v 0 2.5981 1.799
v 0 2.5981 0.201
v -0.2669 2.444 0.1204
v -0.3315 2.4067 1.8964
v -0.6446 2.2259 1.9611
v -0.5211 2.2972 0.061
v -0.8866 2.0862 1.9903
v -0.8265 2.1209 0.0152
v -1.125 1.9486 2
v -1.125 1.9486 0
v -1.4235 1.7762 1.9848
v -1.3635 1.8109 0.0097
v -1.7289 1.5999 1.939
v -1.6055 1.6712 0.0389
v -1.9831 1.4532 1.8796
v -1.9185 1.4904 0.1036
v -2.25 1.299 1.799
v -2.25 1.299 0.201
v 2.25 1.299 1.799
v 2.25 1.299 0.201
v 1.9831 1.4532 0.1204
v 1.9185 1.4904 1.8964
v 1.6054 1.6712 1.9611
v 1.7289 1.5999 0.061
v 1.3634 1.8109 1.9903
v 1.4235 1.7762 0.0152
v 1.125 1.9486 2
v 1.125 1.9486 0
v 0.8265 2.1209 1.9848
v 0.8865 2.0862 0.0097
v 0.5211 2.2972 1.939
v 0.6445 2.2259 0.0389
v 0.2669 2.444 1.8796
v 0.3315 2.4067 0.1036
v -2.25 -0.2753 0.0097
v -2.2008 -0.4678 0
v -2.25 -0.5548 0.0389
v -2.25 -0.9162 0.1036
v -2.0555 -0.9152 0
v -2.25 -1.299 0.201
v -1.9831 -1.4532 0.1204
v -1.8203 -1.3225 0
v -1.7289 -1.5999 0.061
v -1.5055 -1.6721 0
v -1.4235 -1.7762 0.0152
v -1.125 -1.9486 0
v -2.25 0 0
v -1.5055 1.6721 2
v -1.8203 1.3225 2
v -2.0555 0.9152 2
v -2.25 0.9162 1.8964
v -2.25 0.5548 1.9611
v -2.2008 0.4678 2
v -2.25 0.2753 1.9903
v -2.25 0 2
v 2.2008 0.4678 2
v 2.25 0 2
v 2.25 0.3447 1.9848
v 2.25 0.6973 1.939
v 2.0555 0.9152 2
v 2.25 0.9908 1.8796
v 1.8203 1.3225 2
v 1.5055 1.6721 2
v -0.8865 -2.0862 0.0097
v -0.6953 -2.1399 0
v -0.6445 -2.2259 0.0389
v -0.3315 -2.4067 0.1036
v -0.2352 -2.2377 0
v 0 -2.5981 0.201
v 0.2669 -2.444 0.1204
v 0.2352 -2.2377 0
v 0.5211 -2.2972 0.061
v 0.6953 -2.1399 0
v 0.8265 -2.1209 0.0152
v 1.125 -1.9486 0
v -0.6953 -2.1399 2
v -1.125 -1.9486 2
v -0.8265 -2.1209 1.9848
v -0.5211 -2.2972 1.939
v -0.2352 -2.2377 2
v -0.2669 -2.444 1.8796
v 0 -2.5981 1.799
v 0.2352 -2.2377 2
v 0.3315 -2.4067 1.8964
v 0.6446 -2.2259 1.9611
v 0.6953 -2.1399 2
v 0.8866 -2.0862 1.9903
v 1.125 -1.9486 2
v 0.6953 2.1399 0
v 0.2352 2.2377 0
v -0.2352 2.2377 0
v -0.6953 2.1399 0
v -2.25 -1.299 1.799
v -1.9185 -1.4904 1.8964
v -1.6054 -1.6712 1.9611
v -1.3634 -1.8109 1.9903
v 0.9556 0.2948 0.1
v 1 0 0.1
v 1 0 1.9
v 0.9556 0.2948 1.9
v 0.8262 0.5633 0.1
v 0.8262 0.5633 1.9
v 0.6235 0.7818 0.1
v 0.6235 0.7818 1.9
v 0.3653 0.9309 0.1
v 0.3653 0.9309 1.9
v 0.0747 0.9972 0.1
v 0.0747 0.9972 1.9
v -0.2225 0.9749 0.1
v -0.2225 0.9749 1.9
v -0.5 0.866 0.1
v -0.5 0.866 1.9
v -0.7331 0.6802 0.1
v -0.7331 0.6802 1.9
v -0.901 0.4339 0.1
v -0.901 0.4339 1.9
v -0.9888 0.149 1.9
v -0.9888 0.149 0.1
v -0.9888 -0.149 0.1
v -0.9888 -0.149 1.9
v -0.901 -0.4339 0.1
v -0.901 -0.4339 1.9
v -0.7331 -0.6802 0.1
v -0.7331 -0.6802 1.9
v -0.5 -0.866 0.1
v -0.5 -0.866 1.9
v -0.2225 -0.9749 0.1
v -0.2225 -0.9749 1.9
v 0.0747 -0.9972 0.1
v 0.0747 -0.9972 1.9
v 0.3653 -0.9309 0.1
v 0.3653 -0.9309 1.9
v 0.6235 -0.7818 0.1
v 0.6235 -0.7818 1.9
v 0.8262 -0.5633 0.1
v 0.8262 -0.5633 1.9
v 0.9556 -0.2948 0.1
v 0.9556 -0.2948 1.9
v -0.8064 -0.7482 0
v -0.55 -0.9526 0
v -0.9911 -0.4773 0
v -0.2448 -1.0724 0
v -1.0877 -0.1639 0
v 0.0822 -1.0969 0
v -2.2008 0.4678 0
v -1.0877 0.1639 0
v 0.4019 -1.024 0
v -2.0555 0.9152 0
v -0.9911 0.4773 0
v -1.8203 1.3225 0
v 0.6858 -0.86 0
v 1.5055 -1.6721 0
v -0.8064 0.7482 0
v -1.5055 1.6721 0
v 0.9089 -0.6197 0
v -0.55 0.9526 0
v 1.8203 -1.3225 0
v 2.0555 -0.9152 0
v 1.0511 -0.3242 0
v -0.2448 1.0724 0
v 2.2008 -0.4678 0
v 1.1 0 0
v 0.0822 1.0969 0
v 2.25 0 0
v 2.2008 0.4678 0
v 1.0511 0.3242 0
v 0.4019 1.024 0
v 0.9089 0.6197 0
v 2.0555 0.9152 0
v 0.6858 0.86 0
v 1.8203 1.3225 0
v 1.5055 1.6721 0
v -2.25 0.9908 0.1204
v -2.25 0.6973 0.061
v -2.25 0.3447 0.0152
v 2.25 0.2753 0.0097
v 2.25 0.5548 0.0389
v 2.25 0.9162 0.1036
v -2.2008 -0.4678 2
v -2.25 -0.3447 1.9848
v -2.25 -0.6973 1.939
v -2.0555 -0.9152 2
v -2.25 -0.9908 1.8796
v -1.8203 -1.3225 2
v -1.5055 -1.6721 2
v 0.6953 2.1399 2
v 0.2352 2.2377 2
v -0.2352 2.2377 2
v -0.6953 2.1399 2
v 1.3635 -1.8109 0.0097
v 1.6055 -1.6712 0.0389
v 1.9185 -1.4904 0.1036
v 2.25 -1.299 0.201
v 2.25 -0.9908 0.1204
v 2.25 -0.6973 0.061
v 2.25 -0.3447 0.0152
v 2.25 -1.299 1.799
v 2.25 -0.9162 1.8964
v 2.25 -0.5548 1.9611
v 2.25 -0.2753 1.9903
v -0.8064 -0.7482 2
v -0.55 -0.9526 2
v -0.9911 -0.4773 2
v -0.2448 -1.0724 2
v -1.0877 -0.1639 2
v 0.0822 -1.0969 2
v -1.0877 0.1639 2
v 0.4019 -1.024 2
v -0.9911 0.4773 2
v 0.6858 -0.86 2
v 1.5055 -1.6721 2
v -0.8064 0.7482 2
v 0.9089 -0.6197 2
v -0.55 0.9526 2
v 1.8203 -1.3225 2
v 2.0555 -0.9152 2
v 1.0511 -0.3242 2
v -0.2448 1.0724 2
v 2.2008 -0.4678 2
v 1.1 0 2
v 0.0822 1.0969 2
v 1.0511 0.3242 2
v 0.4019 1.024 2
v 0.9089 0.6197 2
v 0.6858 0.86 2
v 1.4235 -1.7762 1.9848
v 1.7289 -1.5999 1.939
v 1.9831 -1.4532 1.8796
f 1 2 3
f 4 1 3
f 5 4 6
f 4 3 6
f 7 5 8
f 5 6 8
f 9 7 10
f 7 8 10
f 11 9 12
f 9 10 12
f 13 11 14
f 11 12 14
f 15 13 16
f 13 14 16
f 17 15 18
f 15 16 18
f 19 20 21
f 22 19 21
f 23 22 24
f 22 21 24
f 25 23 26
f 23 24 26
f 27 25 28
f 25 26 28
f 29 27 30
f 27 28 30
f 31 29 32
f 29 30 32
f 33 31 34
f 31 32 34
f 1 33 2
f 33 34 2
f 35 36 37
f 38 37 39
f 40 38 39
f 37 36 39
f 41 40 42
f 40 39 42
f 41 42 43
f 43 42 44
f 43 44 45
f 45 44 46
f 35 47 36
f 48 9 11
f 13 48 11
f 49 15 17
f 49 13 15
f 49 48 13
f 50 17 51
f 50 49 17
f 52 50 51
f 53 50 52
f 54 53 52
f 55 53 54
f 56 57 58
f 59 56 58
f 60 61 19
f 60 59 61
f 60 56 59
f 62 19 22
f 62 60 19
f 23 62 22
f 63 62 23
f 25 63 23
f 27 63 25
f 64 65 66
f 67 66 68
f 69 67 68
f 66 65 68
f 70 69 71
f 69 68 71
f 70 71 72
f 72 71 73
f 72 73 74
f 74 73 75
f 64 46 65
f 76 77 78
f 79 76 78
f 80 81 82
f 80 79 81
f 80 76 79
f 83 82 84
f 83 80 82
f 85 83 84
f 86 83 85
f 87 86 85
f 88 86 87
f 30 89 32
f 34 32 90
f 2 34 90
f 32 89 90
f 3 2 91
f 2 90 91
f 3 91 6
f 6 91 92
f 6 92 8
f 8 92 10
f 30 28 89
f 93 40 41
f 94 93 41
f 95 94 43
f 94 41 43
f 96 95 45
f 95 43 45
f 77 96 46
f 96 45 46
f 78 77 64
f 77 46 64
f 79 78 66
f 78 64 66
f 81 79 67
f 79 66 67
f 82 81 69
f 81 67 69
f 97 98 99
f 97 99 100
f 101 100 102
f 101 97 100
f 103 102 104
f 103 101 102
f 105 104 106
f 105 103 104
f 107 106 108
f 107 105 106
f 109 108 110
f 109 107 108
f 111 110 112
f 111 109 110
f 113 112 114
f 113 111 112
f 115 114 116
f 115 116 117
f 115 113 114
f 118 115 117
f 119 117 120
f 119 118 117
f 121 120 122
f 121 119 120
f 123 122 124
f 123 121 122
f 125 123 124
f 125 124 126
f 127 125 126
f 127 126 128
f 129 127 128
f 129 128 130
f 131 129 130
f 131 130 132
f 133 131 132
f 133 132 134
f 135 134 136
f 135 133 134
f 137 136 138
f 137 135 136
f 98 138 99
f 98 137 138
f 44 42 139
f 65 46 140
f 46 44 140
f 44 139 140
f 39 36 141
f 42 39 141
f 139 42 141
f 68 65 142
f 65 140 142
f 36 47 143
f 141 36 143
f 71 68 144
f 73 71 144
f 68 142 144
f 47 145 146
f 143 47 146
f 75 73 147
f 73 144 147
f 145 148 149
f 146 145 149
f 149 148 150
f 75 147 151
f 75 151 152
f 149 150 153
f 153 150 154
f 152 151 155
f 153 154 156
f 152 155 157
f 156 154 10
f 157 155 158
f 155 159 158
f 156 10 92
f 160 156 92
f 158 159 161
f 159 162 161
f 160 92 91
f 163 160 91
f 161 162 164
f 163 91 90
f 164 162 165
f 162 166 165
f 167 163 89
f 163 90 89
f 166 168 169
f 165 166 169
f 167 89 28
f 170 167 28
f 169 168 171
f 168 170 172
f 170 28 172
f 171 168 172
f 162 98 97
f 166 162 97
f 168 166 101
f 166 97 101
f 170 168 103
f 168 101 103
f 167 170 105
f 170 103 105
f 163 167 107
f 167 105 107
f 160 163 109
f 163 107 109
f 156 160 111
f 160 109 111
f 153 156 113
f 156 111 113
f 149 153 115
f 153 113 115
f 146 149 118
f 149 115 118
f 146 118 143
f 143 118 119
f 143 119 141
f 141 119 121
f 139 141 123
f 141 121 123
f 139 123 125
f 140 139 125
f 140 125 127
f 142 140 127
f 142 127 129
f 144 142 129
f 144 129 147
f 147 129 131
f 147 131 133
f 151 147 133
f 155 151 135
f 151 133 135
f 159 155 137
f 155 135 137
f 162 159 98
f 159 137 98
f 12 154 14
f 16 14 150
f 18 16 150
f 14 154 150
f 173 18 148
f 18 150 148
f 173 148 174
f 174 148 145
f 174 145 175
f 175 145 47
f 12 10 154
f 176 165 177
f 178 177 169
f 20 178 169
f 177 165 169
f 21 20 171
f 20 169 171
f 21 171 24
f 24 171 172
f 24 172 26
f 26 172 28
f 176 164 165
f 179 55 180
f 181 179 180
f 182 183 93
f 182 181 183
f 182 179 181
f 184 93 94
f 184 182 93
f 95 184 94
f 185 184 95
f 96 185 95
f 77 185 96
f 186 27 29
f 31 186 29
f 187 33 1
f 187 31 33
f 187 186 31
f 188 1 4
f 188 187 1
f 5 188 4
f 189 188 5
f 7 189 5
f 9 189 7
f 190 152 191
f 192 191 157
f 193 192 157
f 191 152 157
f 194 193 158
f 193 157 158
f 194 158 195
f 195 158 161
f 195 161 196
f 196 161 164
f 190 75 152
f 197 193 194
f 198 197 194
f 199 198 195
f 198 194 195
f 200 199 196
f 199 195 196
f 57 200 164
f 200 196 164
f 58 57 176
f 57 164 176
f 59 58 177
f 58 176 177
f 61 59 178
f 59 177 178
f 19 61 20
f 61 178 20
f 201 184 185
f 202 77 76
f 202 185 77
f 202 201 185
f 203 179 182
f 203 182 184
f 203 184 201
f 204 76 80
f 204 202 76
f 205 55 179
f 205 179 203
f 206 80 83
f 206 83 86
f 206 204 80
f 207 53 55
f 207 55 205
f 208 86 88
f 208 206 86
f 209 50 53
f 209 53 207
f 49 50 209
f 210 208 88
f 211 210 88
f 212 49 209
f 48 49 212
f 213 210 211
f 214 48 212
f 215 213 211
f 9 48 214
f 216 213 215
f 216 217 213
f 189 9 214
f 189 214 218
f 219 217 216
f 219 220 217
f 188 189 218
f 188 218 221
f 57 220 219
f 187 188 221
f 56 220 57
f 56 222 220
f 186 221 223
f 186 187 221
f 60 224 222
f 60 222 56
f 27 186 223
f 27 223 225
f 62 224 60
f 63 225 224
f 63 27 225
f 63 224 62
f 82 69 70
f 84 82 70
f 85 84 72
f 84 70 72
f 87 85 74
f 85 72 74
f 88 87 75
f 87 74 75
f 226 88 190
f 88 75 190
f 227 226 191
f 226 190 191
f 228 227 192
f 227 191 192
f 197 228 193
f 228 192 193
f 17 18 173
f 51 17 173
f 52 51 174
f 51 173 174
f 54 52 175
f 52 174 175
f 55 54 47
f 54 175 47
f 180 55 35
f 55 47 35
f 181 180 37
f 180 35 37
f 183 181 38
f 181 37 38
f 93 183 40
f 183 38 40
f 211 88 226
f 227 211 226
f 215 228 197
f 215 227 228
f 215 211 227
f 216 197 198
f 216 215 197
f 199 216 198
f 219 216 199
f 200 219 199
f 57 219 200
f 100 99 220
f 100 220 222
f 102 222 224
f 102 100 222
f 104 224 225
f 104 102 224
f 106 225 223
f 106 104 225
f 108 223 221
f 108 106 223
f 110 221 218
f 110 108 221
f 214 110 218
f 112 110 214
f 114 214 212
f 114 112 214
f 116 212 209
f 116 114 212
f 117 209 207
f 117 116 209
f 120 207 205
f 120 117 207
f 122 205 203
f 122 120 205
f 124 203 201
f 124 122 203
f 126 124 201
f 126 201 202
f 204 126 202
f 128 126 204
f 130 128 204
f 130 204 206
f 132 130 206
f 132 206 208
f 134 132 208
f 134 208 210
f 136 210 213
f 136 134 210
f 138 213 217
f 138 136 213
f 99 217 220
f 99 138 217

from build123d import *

# Parameters (mm, degrees)
CROQUIS1_R              = 1
SALIENTE_EXTRUIR1_DEPTH = 2
CROQUIS3_OUTSIDE_W      = 14.86
CROQUIS3_OUTSIDE_H      = 15.556
CROQUIS3_OUTSIDE_R      = 2.25
CORTAR_EXTRUIR1_DEPTH   = 2
CORTAR_EXTRUIR1_DRAFT   = 60
CROQUIS4_OUTSIDE_W      = 14.86
CROQUIS4_OUTSIDE_H      = 15.556
CROQUIS4_OUTSIDE_R      = 2.25
CORTAR_EXTRUIR4_DEPTH   = 2
CORTAR_EXTRUIR4_DRAFT   = -60
CHAFL_N1_SIZE           = 0.1


with BuildPart() as part:
    # Croquis1 → Saliente-Extruir1 (new body)
    with BuildSketch(Plane.XY):
        Polygon((0, -2.598076211), (2.25, -1.299038106), (2.25, 1.299038106), (0, 2.598076211), (-2.25, 1.299038106), (-2.25, -1.299038106), align=None)
        Circle(CROQUIS1_R, mode=Mode.SUBTRACT)
    extrude(amount=SALIENTE_EXTRUIR1_DEPTH)


with BuildPart() as cortar_extruir1_tool:
    # Croquis3 outside → Cortar-Extruir1 (with draft: the straight prism first)
    with BuildSketch(Plane.XY):
        Rectangle(CROQUIS3_OUTSIDE_W, CROQUIS3_OUTSIDE_H)
        Circle(CROQUIS3_OUTSIDE_R, mode=Mode.SUBTRACT)
    extrude(amount=CORTAR_EXTRUIR1_DEPTH)
    # Cortar-Extruir1: the draft: its side faces are tilted about the plane it starts from
    cortar_extruir1_sides = [cortar_extruir1_tool.faces().sort_by_distance(p)[0] for p in [
        (0, -7.778, 1),
        (7.43, 0, 1),
        (0, 7.778, 1),
        (-7.43, 0, 1),
        (-2.25, 0, 1),
    ]]
    draft(cortar_extruir1_sides, Plane.XY, CORTAR_EXTRUIR1_DRAFT)


with BuildPart() as part_1:
    add(part.part)

    # Cortar-Extruir1: cut by cortar_extruir1_tool
    add(cortar_extruir1_tool.part, mode=Mode.SUBTRACT)


with BuildPart() as cortar_extruir4_tool:
    # Croquis4 outside → Cortar-Extruir4 (with draft: the straight prism first)
    with BuildSketch(Plane.XY.offset(2)):
        Rectangle(CROQUIS4_OUTSIDE_W, CROQUIS4_OUTSIDE_H)
        Circle(CROQUIS4_OUTSIDE_R, mode=Mode.SUBTRACT)
    extrude(amount=-CORTAR_EXTRUIR4_DEPTH)
    # Cortar-Extruir4: the draft: its side faces are tilted about the plane it starts from
    cortar_extruir4_sides = [cortar_extruir4_tool.faces().sort_by_distance(p)[0] for p in [
        (0, -7.778, 1),
        (7.43, 0, 1),
        (0, 7.778, 1),
        (-7.43, 0, 1),
        (-2.25, 0, 1),
    ]]
    draft(cortar_extruir4_sides, Plane.XY.offset(2), CORTAR_EXTRUIR4_DRAFT)


with BuildPart() as part_2:
    add(part_1.part)

    # Cortar-Extruir4: cut by cortar_extruir4_tool
    add(cortar_extruir4_tool.part, mode=Mode.SUBTRACT)

    # Chaflán1
    chafl_n1_edges = [part_2.edges().sort_by_distance(p)[0] for p in [
        (-1, 0, 0),
        (-1, 0, 2),
    ]]
    chamfer(chafl_n1_edges, length=CHAFL_N1_SIZE)


solid = part_2.part
